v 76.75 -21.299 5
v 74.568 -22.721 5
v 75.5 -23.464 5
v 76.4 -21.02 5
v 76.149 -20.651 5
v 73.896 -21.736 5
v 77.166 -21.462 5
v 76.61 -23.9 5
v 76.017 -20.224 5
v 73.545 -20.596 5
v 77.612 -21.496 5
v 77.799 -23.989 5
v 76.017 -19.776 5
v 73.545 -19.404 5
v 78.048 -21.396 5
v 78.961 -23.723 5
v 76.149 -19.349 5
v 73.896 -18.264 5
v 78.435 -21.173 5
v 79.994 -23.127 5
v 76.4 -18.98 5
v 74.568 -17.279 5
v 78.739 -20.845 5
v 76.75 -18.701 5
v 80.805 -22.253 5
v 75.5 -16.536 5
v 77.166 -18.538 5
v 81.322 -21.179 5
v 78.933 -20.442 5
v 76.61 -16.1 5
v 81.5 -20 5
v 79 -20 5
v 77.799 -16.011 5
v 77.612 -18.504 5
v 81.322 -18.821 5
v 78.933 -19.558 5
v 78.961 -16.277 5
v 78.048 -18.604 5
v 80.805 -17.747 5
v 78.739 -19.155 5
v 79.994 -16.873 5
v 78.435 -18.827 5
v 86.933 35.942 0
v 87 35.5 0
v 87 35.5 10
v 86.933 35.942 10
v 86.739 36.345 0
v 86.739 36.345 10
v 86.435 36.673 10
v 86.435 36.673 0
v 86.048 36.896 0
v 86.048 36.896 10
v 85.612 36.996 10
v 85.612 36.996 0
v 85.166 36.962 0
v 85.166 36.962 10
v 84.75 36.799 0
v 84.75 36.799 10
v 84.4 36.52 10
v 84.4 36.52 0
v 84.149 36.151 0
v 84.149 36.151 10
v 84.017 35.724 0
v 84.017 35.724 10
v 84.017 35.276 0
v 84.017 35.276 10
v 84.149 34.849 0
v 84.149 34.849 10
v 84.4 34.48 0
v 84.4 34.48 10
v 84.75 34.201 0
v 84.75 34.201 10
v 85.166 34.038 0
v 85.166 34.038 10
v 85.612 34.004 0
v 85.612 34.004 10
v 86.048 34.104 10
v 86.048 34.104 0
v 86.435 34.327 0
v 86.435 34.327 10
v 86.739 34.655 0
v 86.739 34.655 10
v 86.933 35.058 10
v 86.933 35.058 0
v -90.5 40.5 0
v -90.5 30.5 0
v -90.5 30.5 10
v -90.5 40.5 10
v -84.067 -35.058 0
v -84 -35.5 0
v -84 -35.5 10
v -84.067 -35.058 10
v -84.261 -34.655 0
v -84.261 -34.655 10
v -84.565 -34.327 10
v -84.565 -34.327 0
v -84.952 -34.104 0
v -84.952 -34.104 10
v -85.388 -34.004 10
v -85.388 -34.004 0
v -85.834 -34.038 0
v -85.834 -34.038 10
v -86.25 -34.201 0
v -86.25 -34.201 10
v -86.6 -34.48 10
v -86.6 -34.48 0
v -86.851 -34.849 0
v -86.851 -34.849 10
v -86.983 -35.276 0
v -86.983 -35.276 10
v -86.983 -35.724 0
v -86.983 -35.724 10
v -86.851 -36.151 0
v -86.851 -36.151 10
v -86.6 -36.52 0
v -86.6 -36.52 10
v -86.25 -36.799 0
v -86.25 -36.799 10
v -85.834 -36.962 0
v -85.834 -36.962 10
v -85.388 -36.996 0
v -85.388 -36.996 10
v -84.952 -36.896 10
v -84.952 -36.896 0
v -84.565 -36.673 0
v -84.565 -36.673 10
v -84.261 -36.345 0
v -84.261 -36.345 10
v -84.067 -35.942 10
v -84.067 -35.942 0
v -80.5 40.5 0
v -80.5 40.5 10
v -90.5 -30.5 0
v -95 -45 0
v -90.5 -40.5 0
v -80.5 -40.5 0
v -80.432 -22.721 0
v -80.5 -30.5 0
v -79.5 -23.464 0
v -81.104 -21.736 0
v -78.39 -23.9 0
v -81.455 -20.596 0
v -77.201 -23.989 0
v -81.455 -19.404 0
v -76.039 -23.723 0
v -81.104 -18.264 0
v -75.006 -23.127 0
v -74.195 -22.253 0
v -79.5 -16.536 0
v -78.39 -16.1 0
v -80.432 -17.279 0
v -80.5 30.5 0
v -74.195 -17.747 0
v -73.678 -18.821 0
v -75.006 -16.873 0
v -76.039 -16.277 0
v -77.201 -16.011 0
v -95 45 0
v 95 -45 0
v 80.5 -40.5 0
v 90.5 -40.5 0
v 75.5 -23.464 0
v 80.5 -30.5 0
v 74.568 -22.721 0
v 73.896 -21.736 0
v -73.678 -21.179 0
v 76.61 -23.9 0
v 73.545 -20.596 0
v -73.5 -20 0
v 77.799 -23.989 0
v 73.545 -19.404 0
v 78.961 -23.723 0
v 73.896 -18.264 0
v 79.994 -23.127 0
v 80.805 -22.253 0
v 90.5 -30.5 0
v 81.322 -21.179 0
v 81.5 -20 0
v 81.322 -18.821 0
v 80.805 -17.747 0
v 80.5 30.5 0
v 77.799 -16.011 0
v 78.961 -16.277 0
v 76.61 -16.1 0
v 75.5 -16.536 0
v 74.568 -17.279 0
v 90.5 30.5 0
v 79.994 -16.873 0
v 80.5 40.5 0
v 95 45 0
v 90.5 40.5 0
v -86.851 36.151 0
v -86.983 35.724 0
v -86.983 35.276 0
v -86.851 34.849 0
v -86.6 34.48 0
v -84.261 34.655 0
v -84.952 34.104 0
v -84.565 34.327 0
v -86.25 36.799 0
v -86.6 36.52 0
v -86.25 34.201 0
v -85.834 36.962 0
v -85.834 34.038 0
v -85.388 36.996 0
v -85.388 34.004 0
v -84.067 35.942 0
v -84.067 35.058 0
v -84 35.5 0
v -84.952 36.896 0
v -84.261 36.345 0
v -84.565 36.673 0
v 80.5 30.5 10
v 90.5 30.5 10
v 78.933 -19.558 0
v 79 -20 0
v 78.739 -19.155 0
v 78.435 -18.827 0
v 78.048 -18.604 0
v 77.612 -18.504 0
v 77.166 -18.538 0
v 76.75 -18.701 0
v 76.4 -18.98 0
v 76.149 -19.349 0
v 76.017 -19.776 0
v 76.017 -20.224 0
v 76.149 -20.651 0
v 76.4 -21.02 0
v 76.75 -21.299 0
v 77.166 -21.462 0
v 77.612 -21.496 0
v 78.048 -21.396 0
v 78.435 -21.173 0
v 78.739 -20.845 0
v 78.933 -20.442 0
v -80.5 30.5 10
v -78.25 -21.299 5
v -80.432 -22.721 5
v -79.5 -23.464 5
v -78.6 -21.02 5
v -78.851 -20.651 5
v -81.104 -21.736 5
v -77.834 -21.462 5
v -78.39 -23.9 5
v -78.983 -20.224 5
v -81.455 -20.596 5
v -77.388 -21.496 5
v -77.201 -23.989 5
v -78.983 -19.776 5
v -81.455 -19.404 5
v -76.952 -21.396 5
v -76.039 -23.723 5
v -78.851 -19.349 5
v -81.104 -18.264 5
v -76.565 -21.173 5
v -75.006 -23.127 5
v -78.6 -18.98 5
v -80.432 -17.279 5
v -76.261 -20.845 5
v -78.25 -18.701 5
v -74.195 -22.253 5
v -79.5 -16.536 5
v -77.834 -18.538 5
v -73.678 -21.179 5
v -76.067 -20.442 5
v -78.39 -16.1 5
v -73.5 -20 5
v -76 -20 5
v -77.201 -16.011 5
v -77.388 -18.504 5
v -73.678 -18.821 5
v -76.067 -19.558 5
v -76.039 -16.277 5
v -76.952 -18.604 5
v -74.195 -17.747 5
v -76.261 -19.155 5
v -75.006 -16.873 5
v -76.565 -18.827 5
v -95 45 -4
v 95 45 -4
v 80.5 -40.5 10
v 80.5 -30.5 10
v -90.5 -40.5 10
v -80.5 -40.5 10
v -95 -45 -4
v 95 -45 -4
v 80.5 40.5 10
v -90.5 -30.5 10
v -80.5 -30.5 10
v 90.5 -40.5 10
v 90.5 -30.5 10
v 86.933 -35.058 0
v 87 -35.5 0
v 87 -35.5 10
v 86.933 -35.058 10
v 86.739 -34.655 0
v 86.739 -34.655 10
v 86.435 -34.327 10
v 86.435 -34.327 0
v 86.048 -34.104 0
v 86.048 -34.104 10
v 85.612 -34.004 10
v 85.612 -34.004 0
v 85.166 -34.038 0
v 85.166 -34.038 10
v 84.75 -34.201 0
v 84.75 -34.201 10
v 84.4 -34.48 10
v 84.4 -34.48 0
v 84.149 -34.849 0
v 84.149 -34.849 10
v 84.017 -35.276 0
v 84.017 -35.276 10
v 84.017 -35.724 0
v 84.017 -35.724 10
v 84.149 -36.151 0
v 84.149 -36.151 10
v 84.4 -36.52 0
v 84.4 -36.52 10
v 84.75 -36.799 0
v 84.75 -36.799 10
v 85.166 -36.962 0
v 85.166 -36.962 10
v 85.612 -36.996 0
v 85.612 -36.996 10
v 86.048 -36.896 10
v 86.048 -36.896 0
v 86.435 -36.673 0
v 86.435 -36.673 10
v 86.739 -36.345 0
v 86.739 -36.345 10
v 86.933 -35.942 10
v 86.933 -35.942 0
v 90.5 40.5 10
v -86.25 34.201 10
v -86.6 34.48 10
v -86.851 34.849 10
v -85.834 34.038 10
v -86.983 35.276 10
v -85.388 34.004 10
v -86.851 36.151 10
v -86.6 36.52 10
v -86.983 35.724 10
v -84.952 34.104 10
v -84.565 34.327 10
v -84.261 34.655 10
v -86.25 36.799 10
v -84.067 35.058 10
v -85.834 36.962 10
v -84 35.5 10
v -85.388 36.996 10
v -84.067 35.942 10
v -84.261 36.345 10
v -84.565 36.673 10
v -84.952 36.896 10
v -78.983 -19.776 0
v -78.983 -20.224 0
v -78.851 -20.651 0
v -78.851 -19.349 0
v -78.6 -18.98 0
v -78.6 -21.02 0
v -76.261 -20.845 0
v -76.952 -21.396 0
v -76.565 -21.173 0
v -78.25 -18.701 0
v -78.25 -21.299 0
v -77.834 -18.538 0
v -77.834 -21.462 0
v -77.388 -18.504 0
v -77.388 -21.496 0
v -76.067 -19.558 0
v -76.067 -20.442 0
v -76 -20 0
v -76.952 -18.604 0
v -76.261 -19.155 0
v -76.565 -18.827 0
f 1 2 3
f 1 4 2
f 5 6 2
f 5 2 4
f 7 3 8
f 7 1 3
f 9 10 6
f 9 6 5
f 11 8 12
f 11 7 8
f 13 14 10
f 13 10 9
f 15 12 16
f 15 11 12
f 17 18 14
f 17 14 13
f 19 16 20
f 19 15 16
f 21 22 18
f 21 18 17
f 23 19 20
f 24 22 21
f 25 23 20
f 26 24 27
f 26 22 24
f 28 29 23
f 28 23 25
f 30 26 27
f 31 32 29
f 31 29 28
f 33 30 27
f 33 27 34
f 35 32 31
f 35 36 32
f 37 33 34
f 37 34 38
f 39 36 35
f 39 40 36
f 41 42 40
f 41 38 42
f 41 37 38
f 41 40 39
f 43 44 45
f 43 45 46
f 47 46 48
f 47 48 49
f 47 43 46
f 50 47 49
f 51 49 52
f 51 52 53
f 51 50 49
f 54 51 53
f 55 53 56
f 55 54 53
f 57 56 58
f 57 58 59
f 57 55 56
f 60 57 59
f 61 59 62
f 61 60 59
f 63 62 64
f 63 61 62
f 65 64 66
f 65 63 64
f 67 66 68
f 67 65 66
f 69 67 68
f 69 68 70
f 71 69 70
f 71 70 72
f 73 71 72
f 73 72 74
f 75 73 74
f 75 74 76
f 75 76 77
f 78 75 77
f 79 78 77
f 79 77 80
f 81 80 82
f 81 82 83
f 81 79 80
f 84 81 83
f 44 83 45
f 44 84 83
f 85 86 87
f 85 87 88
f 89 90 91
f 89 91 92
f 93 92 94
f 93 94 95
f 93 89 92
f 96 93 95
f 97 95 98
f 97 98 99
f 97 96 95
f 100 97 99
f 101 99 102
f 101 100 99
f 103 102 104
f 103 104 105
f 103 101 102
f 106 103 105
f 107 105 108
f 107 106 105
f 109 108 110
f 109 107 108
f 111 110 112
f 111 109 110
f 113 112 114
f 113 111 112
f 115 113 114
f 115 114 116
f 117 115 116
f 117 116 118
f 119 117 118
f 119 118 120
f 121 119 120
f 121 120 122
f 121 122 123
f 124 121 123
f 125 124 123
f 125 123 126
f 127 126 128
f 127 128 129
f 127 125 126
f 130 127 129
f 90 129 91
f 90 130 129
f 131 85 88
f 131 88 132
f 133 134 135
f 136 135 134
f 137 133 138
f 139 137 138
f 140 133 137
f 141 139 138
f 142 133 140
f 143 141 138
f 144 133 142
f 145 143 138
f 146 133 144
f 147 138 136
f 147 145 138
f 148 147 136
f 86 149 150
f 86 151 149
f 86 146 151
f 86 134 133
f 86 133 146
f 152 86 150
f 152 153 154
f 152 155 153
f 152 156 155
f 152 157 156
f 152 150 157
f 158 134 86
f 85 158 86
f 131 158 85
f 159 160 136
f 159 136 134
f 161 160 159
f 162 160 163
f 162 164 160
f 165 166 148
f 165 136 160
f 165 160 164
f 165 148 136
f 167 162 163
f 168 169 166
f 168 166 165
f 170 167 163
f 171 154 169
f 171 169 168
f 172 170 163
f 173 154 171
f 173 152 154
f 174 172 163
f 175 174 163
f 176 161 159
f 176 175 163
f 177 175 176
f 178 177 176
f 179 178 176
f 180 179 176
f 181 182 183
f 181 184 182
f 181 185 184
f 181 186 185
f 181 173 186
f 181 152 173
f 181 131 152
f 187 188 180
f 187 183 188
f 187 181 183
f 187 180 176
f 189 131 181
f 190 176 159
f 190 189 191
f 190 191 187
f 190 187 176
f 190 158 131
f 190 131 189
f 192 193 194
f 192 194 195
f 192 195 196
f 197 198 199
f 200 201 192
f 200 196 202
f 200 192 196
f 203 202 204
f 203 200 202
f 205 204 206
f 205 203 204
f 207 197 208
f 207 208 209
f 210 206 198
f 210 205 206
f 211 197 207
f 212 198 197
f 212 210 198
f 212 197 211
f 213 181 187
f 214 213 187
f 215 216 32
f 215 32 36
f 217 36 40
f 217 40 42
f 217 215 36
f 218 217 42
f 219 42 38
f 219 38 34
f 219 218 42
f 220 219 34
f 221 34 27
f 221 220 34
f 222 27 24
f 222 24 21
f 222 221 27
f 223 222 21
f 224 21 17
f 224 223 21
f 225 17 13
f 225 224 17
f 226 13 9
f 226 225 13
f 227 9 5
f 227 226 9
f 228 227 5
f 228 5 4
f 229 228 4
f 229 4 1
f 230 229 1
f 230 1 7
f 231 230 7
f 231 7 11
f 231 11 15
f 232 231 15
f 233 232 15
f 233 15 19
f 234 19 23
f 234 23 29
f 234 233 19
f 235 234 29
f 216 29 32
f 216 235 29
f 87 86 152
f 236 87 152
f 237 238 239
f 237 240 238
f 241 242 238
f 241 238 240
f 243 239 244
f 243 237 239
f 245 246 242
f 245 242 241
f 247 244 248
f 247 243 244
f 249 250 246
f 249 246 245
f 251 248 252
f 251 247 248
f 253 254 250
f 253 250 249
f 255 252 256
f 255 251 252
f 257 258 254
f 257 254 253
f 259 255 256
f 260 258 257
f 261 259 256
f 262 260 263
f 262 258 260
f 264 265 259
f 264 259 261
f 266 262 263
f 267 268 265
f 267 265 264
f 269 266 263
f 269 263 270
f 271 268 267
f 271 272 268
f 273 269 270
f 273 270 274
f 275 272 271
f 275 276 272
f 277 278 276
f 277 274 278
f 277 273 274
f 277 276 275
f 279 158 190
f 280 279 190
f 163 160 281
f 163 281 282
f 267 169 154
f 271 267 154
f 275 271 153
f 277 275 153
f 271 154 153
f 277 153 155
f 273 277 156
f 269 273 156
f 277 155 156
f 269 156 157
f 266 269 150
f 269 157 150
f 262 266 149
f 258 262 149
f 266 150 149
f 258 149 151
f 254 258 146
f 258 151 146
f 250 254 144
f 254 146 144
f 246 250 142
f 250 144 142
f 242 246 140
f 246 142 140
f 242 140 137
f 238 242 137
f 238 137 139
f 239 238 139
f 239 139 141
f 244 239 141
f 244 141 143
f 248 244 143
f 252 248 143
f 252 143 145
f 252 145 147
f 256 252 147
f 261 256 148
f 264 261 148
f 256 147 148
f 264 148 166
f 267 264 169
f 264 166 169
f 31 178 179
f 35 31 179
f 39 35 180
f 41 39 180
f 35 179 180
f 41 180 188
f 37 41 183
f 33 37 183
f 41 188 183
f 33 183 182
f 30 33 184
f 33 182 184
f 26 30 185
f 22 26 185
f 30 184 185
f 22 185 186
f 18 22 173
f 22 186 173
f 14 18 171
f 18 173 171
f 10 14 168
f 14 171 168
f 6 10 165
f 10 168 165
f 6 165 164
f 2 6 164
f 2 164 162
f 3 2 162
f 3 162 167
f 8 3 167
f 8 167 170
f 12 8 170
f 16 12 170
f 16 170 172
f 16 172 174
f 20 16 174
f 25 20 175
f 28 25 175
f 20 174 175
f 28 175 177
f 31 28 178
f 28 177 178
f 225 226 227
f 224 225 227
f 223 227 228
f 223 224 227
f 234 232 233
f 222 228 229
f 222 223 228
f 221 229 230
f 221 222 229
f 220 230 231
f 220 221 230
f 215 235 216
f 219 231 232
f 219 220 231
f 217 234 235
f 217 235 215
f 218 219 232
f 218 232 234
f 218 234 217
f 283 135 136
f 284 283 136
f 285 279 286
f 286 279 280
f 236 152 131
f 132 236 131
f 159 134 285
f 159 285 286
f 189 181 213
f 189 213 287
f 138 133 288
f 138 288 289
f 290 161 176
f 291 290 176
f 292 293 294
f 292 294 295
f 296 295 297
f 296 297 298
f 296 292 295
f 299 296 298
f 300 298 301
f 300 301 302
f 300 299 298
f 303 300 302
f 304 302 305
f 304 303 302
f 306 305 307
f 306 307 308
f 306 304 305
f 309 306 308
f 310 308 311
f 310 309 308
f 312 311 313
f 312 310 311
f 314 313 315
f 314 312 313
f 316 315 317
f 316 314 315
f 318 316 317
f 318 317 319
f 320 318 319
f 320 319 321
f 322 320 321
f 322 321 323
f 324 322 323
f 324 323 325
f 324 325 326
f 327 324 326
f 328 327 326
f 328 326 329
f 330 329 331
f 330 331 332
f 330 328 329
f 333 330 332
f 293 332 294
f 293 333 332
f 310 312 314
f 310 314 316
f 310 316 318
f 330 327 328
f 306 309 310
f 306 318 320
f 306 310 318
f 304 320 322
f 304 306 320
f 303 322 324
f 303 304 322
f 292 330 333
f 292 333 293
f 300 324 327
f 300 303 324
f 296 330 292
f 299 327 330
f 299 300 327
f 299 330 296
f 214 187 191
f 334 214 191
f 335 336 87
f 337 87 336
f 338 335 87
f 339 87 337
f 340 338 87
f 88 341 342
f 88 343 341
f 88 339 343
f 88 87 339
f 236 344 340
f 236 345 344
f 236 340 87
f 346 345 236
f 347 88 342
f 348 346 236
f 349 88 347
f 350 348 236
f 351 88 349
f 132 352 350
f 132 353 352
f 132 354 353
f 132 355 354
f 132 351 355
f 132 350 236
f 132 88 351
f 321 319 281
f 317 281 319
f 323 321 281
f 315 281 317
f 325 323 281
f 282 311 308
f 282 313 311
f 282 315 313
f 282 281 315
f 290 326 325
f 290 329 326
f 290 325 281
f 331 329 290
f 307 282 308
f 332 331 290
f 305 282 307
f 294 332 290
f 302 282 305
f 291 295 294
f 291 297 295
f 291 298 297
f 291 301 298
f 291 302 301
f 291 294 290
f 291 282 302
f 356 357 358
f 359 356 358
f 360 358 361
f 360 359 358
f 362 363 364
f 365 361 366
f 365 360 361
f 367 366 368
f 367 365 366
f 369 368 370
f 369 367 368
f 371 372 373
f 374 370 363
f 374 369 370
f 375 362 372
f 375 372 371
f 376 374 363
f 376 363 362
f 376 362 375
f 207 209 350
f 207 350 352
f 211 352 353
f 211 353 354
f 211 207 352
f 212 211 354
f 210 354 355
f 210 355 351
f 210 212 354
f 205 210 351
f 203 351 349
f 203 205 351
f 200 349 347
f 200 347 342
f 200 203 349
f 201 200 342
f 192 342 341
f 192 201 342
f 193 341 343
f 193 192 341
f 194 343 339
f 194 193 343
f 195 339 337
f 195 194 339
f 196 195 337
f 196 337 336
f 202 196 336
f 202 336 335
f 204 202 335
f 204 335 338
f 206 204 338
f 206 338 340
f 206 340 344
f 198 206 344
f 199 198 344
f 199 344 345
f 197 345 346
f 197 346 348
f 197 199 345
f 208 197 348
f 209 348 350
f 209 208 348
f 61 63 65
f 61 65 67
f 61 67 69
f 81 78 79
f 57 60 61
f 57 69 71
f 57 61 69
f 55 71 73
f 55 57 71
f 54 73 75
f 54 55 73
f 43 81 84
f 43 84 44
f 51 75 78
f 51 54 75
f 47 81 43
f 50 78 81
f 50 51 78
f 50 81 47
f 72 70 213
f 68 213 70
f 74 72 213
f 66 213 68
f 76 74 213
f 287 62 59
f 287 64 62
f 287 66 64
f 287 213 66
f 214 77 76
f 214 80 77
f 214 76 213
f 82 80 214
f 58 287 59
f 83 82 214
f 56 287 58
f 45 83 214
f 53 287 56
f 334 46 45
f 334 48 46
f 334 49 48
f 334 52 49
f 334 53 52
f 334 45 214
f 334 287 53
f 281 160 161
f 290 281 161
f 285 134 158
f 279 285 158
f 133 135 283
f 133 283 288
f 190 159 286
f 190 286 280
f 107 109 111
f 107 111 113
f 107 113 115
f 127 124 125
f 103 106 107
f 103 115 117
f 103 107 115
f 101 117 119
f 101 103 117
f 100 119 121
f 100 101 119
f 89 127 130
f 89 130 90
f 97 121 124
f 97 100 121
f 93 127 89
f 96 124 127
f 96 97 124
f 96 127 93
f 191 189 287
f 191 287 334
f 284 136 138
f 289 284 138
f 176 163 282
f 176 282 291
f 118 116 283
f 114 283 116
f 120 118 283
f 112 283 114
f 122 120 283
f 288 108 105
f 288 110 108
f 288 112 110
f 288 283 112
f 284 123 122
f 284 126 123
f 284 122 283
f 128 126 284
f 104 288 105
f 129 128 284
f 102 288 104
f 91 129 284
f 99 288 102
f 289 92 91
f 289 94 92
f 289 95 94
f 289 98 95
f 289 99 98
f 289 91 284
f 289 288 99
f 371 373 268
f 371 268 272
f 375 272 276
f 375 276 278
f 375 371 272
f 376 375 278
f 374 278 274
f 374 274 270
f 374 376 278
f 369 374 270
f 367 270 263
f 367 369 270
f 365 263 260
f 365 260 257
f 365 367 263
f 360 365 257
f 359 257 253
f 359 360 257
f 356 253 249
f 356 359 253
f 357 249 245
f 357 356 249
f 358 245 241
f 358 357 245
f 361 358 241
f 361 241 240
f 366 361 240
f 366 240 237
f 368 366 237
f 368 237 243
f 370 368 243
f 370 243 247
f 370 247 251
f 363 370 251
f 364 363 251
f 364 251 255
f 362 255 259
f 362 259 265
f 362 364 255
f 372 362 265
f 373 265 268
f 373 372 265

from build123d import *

# Parameters (mm, degrees)
F0_W     = 190
F0_H     = 90
F0_W_2   = 10
F0_H_2   = 10
F0_R     = 4
F0_R_2   = 1.5
F1_DEPTH = 4
F2_DEPTH = 5
F3_DEPTH = 10


with BuildPart() as f1:
    # F0 (on Top) → F1 (new body)
    with BuildSketch(Plane.XY):
        Rectangle(F0_W, F0_H)
        with Locations((-85.5, -35.5)):
            Rectangle(F0_W_2, F0_H_2, mode=Mode.SUBTRACT)
        with Locations((-77.5, -20)):
            Circle(F0_R, mode=Mode.SUBTRACT)
        with Locations((85.5, -35.5)):
            Rectangle(F0_W_2, F0_H_2, mode=Mode.SUBTRACT)
        with Locations((77.5, -20)):
            Circle(F0_R, mode=Mode.SUBTRACT)
        with Locations((-85.5, 35.5)):
            Rectangle(F0_W_2, F0_H_2, mode=Mode.SUBTRACT)
        with Locations((85.5, 35.5)):
            Rectangle(F0_W_2, F0_H_2, mode=Mode.SUBTRACT)
        with Locations((-85.5, 35.5)):
            Rectangle(F0_W_2, F0_H_2)
        with Locations((-85.5, 35.5)):
            Circle(F0_R_2, mode=Mode.SUBTRACT)
        with Locations((77.5, -20)):
            Circle(F0_R)
        with Locations((77.5, -20)):
            Circle(F0_R_2, mode=Mode.SUBTRACT)
        with Locations((-77.5, -20)):
            Circle(F0_R)
        with Locations((-77.5, -20)):
            Circle(F0_R_2, mode=Mode.SUBTRACT)
        with Locations((85.5, -35.5)):
            Rectangle(F0_W_2, F0_H_2)
        with Locations((85.5, -35.5)):
            Circle(F0_R_2, mode=Mode.SUBTRACT)
        with Locations((-85.5, -35.5)):
            Rectangle(F0_W_2, F0_H_2)
        with Locations((-85.5, -35.5)):
            Circle(F0_R_2, mode=Mode.SUBTRACT)
        with Locations((85.5, 35.5)):
            Rectangle(F0_W_2, F0_H_2)
        with Locations((85.5, 35.5)):
            Circle(F0_R_2, mode=Mode.SUBTRACT)
        with Locations((85.5, -35.5)):
            Circle(F0_R_2)
        with Locations((-85.5, -35.5)):
            Circle(F0_R_2)
        with Locations((85.5, 35.5)):
            Circle(F0_R_2)
        with Locations((-85.5, 35.5)):
            Circle(F0_R_2)
        with Locations((77.5, -20)):
            Circle(F0_R_2)
        with Locations((-77.5, -20)):
            Circle(F0_R_2)
    extrude(amount=-F1_DEPTH)

    # F0 (on Top) → F2 (join)
    with BuildSketch(Plane.XY):
        with Locations((77.5, -20)):
            Circle(F0_R)
        with Locations((77.5, -20)):
            Circle(F0_R_2, mode=Mode.SUBTRACT)
        with Locations((-77.5, -20)):
            Circle(F0_R)
        with Locations((-77.5, -20)):
            Circle(F0_R_2, mode=Mode.SUBTRACT)
    extrude(amount=F2_DEPTH)

    # F0 (on Top) → F3 (join)
    with BuildSketch(Plane.XY):
        with Locations((-85.5, -35.5)):
            Rectangle(F0_W_2, F0_H_2)
        with Locations((-85.5, -35.5)):
            Circle(F0_R_2, mode=Mode.SUBTRACT)
        with Locations((-85.5, 35.5)):
            Rectangle(F0_W_2, F0_H_2)
        with Locations((-85.5, 35.5)):
            Circle(F0_R_2, mode=Mode.SUBTRACT)
        with Locations((85.5, 35.5)):
            Rectangle(F0_W_2, F0_H_2)
        with Locations((85.5, 35.5)):
            Circle(F0_R_2, mode=Mode.SUBTRACT)
        with Locations((85.5, -35.5)):
            Rectangle(F0_W_2, F0_H_2)
        with Locations((85.5, -35.5)):
            Circle(F0_R_2, mode=Mode.SUBTRACT)
    extrude(amount=F3_DEPTH)


solid = f1.part
